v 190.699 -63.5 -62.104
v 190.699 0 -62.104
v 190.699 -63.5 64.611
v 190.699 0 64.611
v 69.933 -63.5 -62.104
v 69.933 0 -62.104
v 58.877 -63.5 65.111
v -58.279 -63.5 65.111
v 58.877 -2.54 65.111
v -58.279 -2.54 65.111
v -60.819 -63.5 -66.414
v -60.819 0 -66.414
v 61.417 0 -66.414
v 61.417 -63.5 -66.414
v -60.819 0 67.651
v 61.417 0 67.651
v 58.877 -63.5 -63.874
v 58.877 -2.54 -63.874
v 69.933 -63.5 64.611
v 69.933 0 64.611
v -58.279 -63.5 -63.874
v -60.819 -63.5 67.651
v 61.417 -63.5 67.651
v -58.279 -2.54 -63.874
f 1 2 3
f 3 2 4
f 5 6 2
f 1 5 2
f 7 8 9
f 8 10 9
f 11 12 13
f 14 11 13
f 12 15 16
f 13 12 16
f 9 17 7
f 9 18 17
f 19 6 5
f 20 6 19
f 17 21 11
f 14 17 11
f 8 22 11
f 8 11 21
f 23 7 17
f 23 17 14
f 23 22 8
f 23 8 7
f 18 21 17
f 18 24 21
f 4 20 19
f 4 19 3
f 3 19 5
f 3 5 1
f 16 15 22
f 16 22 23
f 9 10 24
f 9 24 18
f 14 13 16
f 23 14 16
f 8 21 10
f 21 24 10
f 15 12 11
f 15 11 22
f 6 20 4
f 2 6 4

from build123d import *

# Parameters (mm, degrees)
F0_W     = 122.2361847758
F0_H     = 134.0652927756
F5_DEPTH = 63.5
F6_T     = -2.54
F1_W     = 120.766825974
F1_H     = 126.7148703337
F2_DEPTH = 63.5


# Not quite as in the source:
# - the program builds the solid bodies; features that only make, move or delete a surface that nothing else refers to are left out


with BuildPart() as f5:
    # F0 (on Front) → F5 (new body)
    with BuildSketch(Plane.XZ):
        with Locations((0.2992935479, 0.6186775863)):
            Rectangle(F0_W, F0_H)
    extrude(amount=F5_DEPTH)

    # F6
    f6_openings = [f5.faces().sort_by_distance(p)[0] for p in [
        (0.299294, -63.5, 0.618678),
    ]]
    offset(amount=F6_T, openings=f6_openings)


with BuildPart() as f2:
    # F1 (on Front) → F2 (new body)
    with BuildSketch(Plane.XZ):
        with Locations((130.3160600364, 1.2532249093)):
            Rectangle(F1_W, F1_H)
    extrude(amount=F2_DEPTH)


solid = Compound([f5.part, f2.part])
